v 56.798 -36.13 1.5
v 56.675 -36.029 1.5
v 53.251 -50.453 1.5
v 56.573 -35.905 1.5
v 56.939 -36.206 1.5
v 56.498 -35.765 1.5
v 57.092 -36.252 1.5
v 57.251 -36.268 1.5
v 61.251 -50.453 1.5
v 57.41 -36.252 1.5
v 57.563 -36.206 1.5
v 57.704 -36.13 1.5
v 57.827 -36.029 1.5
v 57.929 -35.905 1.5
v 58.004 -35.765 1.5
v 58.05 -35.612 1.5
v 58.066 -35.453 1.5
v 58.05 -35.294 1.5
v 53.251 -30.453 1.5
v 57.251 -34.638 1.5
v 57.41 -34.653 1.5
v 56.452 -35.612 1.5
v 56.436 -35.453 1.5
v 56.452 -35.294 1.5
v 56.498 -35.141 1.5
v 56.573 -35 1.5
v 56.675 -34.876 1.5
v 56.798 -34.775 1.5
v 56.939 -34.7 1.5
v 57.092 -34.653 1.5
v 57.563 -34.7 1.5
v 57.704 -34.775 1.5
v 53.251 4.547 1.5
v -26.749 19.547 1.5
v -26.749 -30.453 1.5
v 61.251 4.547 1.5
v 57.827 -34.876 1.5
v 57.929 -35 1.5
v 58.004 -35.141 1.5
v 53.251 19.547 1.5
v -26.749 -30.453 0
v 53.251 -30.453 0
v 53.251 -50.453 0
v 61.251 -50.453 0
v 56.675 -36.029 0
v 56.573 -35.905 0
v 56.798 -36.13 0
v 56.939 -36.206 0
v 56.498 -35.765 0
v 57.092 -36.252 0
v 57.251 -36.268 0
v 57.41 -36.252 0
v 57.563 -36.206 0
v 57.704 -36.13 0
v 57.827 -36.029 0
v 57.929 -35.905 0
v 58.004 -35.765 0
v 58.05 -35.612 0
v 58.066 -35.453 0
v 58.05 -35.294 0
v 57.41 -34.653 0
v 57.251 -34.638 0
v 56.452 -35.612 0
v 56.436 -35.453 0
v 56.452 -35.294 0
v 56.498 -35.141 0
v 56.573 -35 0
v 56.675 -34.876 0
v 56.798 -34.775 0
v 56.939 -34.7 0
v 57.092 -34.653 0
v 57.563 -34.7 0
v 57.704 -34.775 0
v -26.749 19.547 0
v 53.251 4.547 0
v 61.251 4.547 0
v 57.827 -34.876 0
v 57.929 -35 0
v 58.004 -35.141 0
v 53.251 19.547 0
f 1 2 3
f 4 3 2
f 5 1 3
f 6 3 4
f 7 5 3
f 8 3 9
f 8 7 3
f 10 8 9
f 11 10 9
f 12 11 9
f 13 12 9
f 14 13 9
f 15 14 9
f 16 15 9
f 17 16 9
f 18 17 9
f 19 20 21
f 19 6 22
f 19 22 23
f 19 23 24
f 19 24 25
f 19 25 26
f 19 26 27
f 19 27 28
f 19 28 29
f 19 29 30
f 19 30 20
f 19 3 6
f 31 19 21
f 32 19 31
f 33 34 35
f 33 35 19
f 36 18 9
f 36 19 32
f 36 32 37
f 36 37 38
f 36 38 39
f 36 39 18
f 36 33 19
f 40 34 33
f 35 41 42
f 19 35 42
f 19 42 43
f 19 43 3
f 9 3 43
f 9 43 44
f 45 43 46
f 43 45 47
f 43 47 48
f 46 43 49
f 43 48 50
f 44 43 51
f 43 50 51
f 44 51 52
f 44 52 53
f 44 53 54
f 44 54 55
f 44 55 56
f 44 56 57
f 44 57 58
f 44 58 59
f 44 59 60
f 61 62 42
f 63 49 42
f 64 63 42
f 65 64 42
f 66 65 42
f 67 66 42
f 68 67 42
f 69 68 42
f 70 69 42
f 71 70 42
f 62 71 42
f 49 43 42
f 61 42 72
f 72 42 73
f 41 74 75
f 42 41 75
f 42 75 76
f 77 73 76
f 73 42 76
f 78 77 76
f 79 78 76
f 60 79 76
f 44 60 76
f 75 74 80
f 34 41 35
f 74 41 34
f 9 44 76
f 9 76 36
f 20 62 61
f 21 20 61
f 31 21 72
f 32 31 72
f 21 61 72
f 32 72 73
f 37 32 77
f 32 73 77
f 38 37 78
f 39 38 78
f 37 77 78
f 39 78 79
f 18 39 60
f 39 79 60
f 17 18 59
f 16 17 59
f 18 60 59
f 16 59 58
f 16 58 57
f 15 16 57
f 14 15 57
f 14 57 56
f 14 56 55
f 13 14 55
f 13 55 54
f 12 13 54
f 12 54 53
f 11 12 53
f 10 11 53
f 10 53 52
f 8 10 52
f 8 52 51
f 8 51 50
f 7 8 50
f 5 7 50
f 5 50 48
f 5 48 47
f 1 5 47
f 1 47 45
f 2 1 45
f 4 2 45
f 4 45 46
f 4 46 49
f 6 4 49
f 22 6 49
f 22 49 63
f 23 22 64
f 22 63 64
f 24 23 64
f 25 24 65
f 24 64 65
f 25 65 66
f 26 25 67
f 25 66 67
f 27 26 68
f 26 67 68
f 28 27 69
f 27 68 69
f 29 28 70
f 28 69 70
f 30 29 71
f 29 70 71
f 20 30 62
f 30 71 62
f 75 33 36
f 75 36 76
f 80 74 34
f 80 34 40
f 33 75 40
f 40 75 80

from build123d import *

# Parameters (mm, degrees)
SKETCH1_W           = 80
SKETCH1_H           = 50
BOSS_EXTRUDE1_DEPTH = 1.5
SKETCH6_W           = 1.5
SKETCH6_H           = 20
BOSS_EXTRUDE4_DEPTH = 8
SKETCH8_W           = 8
SKETCH8_H           = 1.5
BOSS_EXTRUDE5_DEPTH = 35
SKETCH9_R           = 0.815
CUT_EXTRUDE2_DEPTH  = 80.368828479


with BuildPart() as part:
    # Sketch1 → Boss-Extrude1 (new body)
    with BuildSketch(Plane.XY):
        with Locations((13.251028807, -5.452674897)):
            Rectangle(SKETCH1_W, SKETCH1_H)
    extrude(amount=BOSS_EXTRUDE1_DEPTH)

    # Sketch6 → Boss-Extrude4 (add)
    with BuildSketch(Plane(origin=(53.251028807, 0, 0), x_dir=(0, 0, -1), z_dir=(1, 0, 0))):
        with Locations((-0.75, -5.452674897)):
            Rectangle(SKETCH6_W, SKETCH6_H)
    extrude(amount=BOSS_EXTRUDE4_DEPTH)

    # Sketch8 → Boss-Extrude5 (add)
    with BuildSketch(Plane.XZ.offset(15.452674897)):
        with Locations((57.251028807, 0.75)):
            Rectangle(SKETCH8_W, SKETCH8_H)
    extrude(amount=BOSS_EXTRUDE5_DEPTH)

    # Sketch9 → Cut-Extrude2 (cut, through all)
    with BuildSketch(Plane(origin=(0, 0, 0), x_dir=(-1, 0, 0), z_dir=(0, 0, -1))):
        with Locations(Location((-57.251028807, -35.452674897, 0), (0, 0, 90))):
            Circle(SKETCH9_R)
    extrude(amount=-CUT_EXTRUDE2_DEPTH, mode=Mode.SUBTRACT)


solid = part.part
